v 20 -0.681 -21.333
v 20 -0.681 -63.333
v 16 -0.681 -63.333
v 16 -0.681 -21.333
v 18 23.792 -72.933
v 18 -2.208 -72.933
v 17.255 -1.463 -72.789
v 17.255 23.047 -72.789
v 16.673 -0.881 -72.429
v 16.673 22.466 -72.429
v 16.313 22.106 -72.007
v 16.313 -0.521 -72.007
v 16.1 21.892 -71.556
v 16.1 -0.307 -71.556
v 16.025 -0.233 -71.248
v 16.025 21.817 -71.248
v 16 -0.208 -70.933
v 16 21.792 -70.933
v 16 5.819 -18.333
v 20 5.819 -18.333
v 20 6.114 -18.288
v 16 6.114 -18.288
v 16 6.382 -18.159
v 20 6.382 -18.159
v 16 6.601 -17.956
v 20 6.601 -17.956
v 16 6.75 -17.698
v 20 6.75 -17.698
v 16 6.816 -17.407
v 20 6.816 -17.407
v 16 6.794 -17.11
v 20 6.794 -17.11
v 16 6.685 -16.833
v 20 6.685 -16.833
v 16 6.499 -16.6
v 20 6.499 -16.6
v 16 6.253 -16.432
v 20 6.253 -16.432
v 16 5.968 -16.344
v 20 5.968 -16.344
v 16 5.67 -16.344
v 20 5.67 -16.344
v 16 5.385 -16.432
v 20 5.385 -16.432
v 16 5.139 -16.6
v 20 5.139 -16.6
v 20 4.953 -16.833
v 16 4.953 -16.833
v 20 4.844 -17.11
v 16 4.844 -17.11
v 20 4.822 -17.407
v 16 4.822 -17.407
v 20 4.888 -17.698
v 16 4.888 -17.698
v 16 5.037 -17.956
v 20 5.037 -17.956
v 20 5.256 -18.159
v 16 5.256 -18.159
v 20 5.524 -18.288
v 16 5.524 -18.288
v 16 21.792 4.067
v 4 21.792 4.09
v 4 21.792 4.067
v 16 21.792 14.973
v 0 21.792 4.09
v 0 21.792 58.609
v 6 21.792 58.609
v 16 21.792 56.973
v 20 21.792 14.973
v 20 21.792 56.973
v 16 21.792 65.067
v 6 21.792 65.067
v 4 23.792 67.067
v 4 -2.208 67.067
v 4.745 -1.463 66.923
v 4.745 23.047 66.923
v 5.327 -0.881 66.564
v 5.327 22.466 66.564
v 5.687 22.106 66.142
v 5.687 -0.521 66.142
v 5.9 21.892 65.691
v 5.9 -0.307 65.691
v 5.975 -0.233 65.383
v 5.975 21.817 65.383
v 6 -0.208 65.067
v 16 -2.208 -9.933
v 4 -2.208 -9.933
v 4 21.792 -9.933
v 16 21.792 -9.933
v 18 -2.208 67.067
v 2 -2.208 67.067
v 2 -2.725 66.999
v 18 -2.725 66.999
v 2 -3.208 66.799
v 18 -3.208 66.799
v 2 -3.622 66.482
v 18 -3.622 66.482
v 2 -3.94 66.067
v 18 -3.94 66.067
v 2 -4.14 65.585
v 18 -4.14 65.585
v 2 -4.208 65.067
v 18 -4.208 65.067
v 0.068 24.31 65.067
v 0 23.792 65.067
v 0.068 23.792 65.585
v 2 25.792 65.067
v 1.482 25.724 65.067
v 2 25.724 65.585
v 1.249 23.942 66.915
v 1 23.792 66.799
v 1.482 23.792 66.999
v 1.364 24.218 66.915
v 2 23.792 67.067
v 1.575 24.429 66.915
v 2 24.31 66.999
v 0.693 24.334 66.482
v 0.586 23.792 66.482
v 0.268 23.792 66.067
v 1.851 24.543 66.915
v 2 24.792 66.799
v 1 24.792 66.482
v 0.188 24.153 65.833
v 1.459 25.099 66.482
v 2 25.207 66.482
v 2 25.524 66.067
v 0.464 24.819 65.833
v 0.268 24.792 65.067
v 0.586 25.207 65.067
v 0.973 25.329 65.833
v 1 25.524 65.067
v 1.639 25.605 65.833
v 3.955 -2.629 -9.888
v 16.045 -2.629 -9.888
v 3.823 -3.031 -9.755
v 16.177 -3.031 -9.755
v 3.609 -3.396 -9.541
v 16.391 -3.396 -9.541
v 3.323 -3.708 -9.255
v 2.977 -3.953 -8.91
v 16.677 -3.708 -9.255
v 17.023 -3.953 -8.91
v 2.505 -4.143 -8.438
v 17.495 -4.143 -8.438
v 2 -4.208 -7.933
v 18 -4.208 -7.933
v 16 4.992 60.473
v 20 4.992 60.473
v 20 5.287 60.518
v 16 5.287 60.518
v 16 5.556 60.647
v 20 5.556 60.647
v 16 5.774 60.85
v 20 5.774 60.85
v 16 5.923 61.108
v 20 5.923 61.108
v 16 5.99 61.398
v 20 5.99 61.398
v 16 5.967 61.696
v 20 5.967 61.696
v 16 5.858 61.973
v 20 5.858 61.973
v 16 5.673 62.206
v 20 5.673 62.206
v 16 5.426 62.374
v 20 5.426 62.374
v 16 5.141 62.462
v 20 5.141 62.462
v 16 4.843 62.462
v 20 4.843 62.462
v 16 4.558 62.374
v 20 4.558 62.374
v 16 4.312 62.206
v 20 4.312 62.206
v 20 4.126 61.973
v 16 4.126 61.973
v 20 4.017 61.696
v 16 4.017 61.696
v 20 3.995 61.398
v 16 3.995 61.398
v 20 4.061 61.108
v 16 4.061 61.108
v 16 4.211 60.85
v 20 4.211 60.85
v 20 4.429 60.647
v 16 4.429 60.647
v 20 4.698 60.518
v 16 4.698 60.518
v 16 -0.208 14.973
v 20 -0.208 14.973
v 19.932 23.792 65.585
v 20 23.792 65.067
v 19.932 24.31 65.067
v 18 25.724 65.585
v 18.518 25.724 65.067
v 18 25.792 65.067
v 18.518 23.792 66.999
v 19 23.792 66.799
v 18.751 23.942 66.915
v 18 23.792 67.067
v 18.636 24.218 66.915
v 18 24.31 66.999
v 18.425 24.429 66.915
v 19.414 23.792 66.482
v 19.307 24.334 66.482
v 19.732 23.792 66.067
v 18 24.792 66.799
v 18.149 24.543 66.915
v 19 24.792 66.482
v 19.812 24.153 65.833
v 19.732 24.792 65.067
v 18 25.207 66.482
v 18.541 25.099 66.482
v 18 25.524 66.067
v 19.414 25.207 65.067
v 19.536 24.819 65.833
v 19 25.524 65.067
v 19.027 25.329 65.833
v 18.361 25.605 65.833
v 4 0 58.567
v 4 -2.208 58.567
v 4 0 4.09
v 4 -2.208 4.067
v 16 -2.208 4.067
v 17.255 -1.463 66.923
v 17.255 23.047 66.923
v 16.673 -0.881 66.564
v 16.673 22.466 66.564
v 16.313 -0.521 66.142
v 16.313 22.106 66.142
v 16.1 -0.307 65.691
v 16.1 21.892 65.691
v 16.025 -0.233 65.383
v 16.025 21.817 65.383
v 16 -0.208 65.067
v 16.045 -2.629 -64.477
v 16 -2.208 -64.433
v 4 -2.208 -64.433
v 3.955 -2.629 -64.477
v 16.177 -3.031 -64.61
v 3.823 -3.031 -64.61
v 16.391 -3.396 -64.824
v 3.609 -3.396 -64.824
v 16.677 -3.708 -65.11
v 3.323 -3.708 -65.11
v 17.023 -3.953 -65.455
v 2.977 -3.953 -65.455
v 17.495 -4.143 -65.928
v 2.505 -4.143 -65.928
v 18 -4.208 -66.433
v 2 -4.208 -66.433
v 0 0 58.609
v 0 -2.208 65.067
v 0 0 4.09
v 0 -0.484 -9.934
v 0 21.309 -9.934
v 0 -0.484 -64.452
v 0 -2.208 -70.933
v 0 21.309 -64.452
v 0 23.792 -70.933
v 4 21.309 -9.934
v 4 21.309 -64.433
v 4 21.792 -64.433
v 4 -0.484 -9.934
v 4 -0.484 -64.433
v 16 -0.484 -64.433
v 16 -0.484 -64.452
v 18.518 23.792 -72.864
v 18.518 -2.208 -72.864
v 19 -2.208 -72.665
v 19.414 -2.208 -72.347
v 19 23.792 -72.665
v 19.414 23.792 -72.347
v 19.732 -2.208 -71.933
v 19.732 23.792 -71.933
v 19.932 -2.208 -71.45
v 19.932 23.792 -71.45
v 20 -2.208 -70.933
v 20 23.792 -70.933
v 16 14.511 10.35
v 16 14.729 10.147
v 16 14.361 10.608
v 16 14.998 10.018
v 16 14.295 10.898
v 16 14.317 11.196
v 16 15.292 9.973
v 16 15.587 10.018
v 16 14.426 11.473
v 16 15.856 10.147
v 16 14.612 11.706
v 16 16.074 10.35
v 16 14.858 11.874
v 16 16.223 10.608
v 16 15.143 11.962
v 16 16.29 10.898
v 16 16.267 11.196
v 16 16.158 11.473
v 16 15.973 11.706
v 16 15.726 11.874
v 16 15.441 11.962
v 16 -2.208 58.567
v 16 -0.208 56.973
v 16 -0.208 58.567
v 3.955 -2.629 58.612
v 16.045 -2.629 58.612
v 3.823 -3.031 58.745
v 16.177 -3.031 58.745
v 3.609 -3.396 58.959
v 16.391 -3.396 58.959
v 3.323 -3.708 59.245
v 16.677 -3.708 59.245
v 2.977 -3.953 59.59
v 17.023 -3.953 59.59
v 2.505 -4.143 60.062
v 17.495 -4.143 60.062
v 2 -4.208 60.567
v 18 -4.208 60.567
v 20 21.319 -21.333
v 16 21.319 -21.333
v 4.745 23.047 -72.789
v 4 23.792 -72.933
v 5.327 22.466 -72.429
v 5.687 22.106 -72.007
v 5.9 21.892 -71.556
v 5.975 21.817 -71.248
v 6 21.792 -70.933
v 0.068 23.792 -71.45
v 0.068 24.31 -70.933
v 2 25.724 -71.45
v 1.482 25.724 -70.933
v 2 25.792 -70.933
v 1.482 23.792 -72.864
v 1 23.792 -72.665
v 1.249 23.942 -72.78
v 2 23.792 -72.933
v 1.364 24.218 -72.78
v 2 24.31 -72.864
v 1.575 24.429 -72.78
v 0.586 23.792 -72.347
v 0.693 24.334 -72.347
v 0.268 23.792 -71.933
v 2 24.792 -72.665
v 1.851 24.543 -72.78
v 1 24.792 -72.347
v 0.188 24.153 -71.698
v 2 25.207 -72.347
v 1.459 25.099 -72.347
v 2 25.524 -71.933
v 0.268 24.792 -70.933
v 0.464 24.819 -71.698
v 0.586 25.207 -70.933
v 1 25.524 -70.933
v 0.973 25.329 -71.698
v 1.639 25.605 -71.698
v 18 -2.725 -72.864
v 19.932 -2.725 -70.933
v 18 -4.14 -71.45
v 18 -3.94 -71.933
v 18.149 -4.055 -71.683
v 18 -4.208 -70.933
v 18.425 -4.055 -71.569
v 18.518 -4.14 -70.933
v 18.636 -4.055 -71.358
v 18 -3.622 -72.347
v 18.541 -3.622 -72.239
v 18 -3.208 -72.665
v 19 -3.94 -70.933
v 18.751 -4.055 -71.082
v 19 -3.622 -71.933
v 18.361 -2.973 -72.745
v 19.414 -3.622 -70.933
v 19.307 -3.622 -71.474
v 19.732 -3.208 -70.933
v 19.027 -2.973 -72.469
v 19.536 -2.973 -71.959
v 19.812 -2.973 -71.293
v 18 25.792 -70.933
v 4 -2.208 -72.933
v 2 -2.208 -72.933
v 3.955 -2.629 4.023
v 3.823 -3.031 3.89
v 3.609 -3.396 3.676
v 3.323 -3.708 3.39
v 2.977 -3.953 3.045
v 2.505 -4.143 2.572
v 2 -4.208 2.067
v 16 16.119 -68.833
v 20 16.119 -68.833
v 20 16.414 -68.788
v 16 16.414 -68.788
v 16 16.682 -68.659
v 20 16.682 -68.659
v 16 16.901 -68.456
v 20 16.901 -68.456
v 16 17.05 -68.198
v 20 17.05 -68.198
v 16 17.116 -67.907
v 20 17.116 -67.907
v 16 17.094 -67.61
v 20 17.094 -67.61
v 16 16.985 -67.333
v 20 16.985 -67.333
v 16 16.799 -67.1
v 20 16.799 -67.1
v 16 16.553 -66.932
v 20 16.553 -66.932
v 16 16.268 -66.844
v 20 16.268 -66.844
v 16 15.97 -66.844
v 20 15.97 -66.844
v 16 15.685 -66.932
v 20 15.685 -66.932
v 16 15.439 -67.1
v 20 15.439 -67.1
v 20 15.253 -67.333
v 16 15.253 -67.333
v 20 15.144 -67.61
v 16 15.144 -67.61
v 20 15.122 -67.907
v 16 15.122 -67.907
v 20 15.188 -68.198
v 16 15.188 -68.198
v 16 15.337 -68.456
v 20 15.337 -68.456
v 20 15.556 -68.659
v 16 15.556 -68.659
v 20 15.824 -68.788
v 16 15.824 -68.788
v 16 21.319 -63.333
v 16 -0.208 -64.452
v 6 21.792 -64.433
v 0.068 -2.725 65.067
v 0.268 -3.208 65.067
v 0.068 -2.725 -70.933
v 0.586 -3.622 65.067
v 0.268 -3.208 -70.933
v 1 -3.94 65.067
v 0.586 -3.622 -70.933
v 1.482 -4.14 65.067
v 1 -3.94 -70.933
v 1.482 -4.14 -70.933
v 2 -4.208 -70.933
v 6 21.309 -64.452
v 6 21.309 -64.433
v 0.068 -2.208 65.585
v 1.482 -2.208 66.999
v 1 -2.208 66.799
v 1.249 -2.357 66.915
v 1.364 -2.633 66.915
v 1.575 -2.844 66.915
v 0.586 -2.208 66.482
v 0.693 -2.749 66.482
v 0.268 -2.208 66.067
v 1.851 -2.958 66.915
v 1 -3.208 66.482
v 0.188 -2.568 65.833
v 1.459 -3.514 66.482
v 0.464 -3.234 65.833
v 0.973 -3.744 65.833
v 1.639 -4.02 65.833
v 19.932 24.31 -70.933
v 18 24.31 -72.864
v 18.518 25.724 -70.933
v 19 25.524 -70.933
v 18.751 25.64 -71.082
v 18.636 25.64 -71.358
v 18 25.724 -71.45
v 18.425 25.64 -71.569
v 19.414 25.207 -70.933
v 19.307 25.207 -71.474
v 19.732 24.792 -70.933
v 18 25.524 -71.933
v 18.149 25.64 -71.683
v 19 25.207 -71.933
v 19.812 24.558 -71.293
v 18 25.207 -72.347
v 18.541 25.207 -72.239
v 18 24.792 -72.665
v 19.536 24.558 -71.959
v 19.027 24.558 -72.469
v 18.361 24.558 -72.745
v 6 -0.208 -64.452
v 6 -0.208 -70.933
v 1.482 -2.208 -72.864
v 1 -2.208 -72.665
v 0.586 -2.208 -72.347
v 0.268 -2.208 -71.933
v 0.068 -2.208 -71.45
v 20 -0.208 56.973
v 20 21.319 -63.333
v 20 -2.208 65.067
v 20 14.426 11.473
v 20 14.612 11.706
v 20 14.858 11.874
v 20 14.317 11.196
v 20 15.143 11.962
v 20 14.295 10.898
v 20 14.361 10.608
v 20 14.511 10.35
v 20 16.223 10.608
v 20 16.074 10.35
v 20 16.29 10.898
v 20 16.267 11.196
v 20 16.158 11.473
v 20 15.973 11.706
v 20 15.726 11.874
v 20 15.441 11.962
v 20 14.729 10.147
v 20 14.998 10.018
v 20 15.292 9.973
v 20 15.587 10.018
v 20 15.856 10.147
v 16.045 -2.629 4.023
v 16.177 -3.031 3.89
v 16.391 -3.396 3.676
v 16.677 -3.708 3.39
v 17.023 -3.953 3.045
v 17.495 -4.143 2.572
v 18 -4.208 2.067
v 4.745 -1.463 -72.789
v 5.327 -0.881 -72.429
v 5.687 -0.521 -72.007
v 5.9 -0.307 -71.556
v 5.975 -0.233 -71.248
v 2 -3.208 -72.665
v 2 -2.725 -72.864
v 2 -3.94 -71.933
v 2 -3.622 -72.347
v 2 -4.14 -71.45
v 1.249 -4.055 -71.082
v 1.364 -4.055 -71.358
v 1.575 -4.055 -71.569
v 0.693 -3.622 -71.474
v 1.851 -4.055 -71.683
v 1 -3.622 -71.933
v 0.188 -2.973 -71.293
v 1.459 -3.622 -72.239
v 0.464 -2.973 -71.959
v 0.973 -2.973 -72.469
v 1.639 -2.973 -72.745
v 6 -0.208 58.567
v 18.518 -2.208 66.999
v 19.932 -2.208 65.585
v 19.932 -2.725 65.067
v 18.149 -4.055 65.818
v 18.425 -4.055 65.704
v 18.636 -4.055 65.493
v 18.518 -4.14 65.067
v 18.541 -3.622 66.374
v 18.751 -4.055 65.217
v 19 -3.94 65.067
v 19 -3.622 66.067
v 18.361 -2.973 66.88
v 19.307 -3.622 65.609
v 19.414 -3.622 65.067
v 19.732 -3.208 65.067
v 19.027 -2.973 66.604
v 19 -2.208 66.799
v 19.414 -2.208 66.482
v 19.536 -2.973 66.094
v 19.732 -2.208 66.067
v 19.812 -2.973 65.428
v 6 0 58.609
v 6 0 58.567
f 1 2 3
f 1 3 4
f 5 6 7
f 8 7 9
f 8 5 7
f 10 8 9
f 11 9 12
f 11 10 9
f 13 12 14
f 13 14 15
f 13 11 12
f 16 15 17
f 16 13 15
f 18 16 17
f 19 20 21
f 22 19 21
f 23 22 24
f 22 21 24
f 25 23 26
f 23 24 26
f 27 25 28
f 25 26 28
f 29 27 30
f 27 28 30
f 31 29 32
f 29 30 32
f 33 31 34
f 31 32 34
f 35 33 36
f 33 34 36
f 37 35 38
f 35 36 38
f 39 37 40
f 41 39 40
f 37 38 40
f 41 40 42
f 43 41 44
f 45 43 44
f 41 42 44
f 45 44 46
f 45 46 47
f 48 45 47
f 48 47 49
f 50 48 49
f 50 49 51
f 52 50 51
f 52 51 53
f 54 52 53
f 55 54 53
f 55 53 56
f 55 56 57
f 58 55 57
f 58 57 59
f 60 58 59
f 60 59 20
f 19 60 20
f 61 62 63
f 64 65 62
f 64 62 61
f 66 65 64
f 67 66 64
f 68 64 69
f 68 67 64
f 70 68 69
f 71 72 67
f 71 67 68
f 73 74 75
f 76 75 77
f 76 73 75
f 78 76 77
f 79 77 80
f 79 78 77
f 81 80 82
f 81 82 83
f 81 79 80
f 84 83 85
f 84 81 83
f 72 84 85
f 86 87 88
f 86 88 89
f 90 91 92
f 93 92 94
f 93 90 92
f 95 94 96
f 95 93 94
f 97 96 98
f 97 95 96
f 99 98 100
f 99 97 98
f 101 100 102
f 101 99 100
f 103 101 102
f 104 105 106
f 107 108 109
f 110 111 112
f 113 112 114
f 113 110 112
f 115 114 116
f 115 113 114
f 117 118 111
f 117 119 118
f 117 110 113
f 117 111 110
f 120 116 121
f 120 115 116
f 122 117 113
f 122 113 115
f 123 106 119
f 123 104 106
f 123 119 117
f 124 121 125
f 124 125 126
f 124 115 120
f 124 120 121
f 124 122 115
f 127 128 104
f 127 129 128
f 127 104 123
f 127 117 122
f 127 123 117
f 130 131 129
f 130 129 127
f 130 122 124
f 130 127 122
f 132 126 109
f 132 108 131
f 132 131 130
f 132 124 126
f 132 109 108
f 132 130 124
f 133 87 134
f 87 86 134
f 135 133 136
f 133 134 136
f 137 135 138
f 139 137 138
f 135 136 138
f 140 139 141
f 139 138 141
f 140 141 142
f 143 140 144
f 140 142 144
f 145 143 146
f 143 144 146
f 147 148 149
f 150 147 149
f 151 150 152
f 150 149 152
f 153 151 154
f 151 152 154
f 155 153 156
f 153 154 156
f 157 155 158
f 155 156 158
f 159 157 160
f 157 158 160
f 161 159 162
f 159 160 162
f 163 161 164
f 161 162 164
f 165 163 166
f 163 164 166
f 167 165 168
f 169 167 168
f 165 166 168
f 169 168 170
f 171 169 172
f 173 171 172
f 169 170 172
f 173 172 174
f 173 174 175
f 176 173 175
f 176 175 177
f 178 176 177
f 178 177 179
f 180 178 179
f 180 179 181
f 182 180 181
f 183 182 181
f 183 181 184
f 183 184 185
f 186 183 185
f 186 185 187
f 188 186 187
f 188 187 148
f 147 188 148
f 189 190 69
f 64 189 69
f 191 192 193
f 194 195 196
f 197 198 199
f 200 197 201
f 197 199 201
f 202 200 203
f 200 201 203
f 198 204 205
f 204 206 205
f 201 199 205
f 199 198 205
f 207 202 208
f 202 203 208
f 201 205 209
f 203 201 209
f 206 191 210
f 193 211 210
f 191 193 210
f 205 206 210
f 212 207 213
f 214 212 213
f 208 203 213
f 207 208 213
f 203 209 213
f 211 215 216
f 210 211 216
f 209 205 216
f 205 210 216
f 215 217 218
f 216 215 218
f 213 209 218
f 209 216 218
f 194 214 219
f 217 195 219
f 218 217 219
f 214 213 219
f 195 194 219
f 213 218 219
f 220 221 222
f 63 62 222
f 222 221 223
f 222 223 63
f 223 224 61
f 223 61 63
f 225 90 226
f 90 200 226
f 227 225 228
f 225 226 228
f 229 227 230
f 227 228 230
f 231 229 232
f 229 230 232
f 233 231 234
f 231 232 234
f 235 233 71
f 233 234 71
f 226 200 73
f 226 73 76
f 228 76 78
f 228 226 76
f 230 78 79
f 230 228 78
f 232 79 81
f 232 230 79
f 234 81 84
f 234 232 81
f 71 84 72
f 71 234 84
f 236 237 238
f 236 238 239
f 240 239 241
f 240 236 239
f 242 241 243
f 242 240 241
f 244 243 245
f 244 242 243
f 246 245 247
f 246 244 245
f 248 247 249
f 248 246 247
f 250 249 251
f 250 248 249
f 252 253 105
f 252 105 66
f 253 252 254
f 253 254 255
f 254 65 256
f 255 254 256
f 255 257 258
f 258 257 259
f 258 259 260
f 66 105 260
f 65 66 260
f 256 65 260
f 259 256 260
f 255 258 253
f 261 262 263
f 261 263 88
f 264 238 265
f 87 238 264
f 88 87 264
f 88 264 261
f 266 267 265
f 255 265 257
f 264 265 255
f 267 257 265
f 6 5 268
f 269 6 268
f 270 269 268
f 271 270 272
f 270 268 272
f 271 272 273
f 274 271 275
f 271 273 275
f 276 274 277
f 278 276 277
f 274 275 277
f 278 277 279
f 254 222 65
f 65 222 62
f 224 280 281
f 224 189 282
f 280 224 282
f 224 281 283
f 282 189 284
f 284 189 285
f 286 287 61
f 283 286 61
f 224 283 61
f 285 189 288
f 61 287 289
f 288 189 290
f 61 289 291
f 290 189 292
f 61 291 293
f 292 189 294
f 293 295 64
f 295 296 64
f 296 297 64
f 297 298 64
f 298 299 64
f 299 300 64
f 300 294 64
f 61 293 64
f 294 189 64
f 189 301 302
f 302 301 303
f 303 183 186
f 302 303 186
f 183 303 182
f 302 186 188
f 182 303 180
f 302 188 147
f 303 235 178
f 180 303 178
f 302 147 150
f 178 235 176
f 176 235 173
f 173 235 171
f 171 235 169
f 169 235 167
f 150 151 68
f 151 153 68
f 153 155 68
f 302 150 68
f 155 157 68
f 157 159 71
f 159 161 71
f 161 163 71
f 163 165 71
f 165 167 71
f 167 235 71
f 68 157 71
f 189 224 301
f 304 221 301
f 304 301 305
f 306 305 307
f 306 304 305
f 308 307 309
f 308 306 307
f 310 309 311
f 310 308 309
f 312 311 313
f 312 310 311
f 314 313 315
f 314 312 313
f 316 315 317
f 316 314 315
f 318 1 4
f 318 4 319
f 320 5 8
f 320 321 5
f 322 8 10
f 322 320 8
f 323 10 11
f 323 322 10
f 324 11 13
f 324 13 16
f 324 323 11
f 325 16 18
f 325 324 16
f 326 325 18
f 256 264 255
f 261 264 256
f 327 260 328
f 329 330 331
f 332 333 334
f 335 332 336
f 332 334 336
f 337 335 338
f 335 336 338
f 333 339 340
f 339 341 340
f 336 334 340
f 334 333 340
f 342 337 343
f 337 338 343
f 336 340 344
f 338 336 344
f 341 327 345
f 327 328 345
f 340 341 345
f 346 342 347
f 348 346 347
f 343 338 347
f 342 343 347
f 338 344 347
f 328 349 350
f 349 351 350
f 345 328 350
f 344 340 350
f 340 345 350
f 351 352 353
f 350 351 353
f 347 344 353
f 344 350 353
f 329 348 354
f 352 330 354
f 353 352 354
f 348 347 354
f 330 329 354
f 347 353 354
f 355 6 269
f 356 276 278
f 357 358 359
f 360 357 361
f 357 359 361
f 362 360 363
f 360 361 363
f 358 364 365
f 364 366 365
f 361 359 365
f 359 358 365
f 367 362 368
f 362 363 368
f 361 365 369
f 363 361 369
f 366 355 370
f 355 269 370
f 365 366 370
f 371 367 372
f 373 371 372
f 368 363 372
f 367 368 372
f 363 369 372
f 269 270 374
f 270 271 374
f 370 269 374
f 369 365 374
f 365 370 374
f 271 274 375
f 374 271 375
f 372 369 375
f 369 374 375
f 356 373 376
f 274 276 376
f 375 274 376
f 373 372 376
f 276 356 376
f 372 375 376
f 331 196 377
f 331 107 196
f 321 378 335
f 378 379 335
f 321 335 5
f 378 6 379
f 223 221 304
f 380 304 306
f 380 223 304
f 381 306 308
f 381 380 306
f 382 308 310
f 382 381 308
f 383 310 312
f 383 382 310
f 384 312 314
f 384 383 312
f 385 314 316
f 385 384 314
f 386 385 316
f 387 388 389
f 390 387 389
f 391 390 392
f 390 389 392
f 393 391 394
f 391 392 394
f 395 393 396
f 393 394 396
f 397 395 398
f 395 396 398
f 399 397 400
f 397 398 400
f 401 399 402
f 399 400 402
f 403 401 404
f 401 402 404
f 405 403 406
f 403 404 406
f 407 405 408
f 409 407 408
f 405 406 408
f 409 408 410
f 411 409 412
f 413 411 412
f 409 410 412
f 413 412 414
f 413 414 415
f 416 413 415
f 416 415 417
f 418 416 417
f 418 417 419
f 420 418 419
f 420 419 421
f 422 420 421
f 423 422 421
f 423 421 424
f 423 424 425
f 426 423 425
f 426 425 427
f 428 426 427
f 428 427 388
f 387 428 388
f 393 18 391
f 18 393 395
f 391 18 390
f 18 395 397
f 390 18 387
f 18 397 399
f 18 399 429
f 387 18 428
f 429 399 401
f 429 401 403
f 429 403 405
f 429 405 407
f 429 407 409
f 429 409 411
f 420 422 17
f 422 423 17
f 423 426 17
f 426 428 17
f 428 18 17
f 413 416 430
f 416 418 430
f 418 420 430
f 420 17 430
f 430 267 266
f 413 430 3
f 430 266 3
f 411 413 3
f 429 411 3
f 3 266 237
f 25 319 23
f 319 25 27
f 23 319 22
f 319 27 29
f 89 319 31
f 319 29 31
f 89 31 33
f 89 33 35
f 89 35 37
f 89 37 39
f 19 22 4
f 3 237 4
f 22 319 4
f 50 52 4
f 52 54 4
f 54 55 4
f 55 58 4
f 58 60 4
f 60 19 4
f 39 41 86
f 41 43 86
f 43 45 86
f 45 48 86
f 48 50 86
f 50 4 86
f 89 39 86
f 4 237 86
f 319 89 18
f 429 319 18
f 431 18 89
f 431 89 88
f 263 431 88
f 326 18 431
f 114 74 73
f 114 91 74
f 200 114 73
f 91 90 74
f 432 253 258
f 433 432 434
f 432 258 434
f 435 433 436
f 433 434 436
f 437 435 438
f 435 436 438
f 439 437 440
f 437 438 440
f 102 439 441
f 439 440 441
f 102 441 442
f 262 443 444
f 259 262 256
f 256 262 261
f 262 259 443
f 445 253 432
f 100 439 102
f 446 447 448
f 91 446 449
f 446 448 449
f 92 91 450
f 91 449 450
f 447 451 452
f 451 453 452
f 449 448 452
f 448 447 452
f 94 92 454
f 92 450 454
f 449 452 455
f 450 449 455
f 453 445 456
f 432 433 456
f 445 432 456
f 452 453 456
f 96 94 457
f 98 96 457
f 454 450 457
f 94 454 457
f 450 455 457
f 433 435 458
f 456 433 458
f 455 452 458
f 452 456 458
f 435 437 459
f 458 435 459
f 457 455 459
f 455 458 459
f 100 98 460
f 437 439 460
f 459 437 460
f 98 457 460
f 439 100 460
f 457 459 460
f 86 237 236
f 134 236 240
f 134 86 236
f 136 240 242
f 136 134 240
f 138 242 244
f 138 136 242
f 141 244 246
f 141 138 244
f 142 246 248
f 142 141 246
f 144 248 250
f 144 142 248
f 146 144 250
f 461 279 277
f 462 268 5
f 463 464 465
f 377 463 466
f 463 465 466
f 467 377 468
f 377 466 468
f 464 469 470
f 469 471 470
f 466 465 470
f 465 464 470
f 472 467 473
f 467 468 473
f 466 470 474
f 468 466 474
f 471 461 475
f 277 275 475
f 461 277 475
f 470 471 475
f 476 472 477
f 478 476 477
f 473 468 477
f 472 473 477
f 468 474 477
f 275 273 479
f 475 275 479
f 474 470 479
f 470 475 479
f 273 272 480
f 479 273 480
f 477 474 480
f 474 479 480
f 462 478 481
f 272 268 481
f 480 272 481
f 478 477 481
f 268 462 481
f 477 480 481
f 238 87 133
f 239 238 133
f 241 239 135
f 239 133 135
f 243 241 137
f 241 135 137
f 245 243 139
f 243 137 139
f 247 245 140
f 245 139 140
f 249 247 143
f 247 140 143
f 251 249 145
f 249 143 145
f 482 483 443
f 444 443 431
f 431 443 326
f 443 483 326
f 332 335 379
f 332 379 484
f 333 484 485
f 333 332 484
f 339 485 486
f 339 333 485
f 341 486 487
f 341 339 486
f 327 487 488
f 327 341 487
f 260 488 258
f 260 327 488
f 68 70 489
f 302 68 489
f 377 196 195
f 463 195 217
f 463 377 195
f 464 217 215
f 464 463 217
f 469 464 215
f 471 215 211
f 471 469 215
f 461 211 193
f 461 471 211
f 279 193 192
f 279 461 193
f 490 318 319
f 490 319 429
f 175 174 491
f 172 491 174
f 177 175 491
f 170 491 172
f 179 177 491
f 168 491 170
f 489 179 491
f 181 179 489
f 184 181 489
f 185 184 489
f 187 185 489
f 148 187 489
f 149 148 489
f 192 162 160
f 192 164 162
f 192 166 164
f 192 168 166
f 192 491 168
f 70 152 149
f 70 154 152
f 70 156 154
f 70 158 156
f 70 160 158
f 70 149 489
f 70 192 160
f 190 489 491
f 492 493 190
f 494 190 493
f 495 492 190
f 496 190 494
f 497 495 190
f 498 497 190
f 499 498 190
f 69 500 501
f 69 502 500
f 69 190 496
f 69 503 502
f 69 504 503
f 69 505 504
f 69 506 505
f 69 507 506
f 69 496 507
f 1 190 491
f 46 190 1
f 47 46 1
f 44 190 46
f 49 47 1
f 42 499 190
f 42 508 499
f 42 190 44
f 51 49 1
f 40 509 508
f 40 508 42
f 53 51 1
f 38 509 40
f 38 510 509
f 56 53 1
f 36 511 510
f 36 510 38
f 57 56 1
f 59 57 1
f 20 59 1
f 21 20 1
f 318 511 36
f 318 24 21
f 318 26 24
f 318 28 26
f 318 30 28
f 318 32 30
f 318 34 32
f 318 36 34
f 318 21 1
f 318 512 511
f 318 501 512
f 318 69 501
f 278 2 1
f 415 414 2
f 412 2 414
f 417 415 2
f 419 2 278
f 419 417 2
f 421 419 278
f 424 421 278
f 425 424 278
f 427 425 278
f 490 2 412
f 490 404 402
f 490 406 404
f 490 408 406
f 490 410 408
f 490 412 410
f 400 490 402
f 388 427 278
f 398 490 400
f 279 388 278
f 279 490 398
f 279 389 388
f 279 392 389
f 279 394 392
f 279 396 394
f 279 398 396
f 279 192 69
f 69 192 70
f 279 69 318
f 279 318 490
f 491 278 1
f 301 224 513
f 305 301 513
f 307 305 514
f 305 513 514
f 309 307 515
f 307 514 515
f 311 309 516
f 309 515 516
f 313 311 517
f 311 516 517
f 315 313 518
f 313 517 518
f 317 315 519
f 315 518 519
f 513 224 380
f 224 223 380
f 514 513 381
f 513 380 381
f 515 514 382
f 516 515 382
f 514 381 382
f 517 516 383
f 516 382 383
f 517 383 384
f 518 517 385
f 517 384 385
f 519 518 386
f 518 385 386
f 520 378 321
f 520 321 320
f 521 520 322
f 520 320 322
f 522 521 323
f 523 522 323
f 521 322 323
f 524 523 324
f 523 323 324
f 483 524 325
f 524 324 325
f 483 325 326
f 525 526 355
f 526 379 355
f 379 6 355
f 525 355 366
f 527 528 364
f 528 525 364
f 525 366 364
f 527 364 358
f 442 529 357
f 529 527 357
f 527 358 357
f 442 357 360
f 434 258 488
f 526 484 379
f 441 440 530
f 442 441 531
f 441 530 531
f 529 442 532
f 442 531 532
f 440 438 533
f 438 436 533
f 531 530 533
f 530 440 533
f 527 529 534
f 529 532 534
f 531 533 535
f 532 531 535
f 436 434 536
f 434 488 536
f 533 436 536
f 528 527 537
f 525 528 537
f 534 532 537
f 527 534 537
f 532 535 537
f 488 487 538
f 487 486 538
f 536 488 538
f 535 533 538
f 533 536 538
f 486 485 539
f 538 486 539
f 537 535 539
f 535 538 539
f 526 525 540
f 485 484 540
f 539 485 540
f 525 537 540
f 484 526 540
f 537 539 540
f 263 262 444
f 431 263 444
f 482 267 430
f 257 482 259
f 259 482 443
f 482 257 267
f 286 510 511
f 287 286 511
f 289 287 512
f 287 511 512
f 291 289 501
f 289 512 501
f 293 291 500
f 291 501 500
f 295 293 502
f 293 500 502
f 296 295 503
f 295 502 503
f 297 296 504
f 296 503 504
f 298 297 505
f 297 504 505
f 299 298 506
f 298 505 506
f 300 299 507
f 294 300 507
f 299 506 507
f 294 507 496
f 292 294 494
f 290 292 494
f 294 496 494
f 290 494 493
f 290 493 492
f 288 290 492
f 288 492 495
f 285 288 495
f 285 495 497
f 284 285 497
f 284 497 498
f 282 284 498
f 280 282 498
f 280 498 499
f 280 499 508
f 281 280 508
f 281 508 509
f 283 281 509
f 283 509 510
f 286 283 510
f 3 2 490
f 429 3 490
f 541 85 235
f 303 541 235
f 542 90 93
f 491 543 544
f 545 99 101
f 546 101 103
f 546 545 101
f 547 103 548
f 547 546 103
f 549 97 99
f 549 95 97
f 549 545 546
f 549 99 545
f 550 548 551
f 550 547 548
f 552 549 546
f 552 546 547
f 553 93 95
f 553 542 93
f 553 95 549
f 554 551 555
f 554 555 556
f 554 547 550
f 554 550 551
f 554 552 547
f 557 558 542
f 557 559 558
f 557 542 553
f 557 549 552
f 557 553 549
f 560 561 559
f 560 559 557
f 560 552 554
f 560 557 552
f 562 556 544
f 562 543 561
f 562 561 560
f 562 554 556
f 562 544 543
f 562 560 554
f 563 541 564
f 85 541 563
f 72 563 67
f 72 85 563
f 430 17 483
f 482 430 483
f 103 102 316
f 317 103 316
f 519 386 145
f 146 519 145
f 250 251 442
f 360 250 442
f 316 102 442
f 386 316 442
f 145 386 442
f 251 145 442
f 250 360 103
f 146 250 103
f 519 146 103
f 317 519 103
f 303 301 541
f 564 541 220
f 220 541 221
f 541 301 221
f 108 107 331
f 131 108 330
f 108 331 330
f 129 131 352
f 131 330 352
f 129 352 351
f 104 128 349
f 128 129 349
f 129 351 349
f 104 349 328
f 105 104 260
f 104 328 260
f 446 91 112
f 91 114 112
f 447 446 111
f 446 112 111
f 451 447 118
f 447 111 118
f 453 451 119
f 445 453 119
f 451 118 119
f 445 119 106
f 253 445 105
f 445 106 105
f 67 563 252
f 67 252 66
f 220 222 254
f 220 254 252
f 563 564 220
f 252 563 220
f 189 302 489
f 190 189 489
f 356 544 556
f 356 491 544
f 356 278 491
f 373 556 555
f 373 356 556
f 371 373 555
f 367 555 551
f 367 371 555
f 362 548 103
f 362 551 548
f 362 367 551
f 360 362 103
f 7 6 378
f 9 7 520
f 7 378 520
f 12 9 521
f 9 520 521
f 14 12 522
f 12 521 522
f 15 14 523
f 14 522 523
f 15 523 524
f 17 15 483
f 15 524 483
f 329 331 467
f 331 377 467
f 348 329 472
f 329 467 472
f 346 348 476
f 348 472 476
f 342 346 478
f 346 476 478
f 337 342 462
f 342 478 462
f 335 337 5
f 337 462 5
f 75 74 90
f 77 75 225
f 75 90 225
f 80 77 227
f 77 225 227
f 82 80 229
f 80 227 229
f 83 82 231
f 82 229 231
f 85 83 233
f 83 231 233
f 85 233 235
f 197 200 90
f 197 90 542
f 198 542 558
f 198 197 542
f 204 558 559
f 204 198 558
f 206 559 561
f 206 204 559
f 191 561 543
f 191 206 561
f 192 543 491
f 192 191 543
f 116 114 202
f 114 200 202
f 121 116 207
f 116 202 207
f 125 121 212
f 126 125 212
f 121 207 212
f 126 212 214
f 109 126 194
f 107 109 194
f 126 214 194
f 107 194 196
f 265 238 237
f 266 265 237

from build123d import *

# Parameters (mm, degrees)
ESQUISSE1_W             = 140
ESQUISSE1_H             = 30
BOSS_EXTRU_1_DEPTH      = 20
ESQUISSE2_R             = 1
ENL_V_MAT_EXTRU_1_DEPTH = 10
ESQUISSE4_R             = 1
ENL_V_MAT_EXTRU_2_DEPTH = 10
ESQUISSE5_W             = 10
ESQUISSE5_H             = 22
ENL_V_MAT_EXTRU_3_DEPTH = 63
ESQUISSE6_W             = 10
ESQUISSE6_H             = 22
ENL_V_MAT_EXTRU_4_DEPTH = 63
ENL_V_MAT_EXTRU_5_REACH = 83.358
ESQUISSE7_W             = 12
ESQUISSE7_H             = 54.5
ENL_V_MAT_EXTRU_6_REACH = 83.358
ESQUISSE8_W             = 12
ESQUISSE8_H             = 54.5
CONG_1_R                = 2
ESQUISSE9_W             = 54.518801533
ESQUISSE9_H             = 21.792349727
ENL_V_MAT_EXTRU_7_DEPTH = 79.996266608
ESQUISSE11_W            = 54.518801533
ESQUISSE11_H            = 21.792349727
ENL_V_MAT_EXTRU_8_DEPTH = 79.996266608


with BuildPart() as part:
    # Esquisse1 → Boss.-Extru.1 (new body)
    with BuildSketch(Plane(origin=(0, 0, 0), x_dir=(0, 0, -1), z_dir=(1, 0, 0))):
        with Locations((2.932604736, 10.792349727)):
            Rectangle(ESQUISSE1_W, ESQUISSE1_H)
    extrude(amount=BOSS_EXTRU_1_DEPTH)

    # Esquisse2 → Enlèv. mat.-Extru.1 (cut)
    with BuildSketch(Plane(origin=(20, 0, 0), x_dir=(0, 0, -1), z_dir=(1, 0, 0))):
        with Locations((67.832604736, 16.118903051)):
            Circle(ESQUISSE2_R)
        with Locations((17.332604736, 5.818903051)):
            Circle(ESQUISSE2_R)
        Polygon((63.332604736, -0.681096949), (21.332604736, -0.681096949), (21.332604736, 21.318903051), (63.332604736, 21.318903051), (63.332604736, 12.318903051), (63.332604736, 8.068903051), align=None)
    extrude(amount=-ENL_V_MAT_EXTRU_1_DEPTH, mode=Mode.SUBTRACT)

    # Esquisse4 → Enlèv. mat.-Extru.2 (cut)
    with BuildSketch(Plane(origin=(20, 26.612998823, 128.329870586), x_dir=(0, 0, 1), z_dir=(1, 0, 0))):
        with Locations(Location((-117.356713594, 11.320649096, 0), (0, 0, 180))):
            Circle(ESQUISSE4_R)
        with Locations(Location((-66.856713594, 21.620649096, 0), (0, 0, 180))):
            Circle(ESQUISSE4_R)
        Polygon((-113.356713594, 26.820649096), (-113.356713594, 4.820649096), (-71.356713594, 4.820649096), (-71.356713594, 13.570649096), (-71.356713594, 18.070649096), (-71.356713594, 26.820649096), align=None)
    extrude(amount=-ENL_V_MAT_EXTRU_2_DEPTH, mode=Mode.SUBTRACT)

    # Esquisse5 → Enlèv. mat.-Extru.3 (cut)
    with BuildSketch(Plane.XY.offset(67.067395264)):
        with Locations((11, 10.792349727)):
            Rectangle(ESQUISSE5_W, ESQUISSE5_H)
    extrude(amount=-ENL_V_MAT_EXTRU_3_DEPTH, mode=Mode.SUBTRACT)

    # Esquisse6 → Enlèv. mat.-Extru.4 (cut)
    with BuildSketch(Plane(origin=(0, 0, -72.932604736), x_dir=(-1, 0, 0), z_dir=(0, 0, -1))):
        with Locations((-11, 10.792349727)):
            Rectangle(ESQUISSE6_W, ESQUISSE6_H)
    extrude(amount=-ENL_V_MAT_EXTRU_4_DEPTH, mode=Mode.SUBTRACT)

    # Enlèv. mat.-Extru.5: up to this face of the body (flat: up to its plane)
    enl_v_mat_extru_5_end = Plane(part.part.faces().sort_by_distance((11, 21.792349727, -41.432604736))[0])
    # Esquisse7 → Enlèv. mat.-Extru.5 (cut, up to the picked face)
    with BuildSketch(Plane.XZ.offset(4.207650273), mode=Mode.PRIVATE) as enl_v_mat_extru_5_sk1:
        with Locations((10, -37.182604736)):
            Rectangle(ESQUISSE7_W, ESQUISSE7_H)
    enl_v_mat_extru_5_tool1 = split(extrude(enl_v_mat_extru_5_sk1.sketch, amount=-ENL_V_MAT_EXTRU_5_REACH, mode=Mode.PRIVATE), bisect_by=enl_v_mat_extru_5_end, keep=Keep.BOTH, mode=Mode.PRIVATE)
    add(enl_v_mat_extru_5_tool1.solids().sort_by(Axis((10, -4.20765, -37.182605), (0, 1, 0)))[0], mode=Mode.SUBTRACT)

    # Enlèv. mat.-Extru.6: up to this face of the body (flat: up to its plane)
    enl_v_mat_extru_6_end = Plane(part.part.faces().sort_by_distance((12.473684211, 21.792349727, 35.652818786))[0])
    # Esquisse8 → Enlèv. mat.-Extru.6 (cut, up to the picked face)
    with BuildSketch(Plane(origin=(0, -4.207650273, 0), x_dir=(-1, 0, 0), z_dir=(0, -1, 0)), mode=Mode.PRIVATE) as enl_v_mat_extru_6_sk1:
        with Locations((-10, -31.317395264)):
            Rectangle(ESQUISSE8_W, ESQUISSE8_H)
    enl_v_mat_extru_6_tool1 = split(extrude(enl_v_mat_extru_6_sk1.sketch, amount=-ENL_V_MAT_EXTRU_6_REACH, mode=Mode.PRIVATE), bisect_by=enl_v_mat_extru_6_end, keep=Keep.BOTH, mode=Mode.PRIVATE)
    add(enl_v_mat_extru_6_tool1.solids().sort_by(Axis((10, -4.20765, 31.317395), (0, 1, 0)))[0], mode=Mode.SUBTRACT)

    # Congé1
    cong_1_edges = [part.edges().sort_by_distance(p)[0] for p in [
        (4, -4.207650273, -37.182604736),
        (10, -4.207650273, -64.432604736),
        (16, -4.207650273, -37.182604736),
        (10, -4.207650273, -9.932604736),
        (20, 10.792349727, -72.932604736),
        (4, -4.207650273, 31.317395264),
        (10, -4.207650273, 4.067395264),
        (16, -4.207650273, 31.317395264),
        (10, -4.207650273, 58.567395264),
        (20, 25.792349727, -2.932604736),
        (20, 10.792349727, 67.067395264),
        (0, 25.792349727, -2.932604736),
        (0, 10.792349727, -72.932604736),
        (0, -4.207650273, -2.932604736),
        (0, 10.792349727, 67.067395264),
        (11, 21.792349727, 67.067395264),
        (6, 10.792349727, 67.067395264),
        (11, -0.207650273, 67.067395264),
        (16, 10.792349727, 67.067395264),
        (10, 25.792349727, 67.067395264),
        (10, 25.792349727, -72.932604736),
        (10, -4.207650273, -72.932604736),
        (10, -4.207650273, 67.067395264),
        (20, -4.207650273, -2.932604736),
        (11, 21.792349727, -72.932604736),
        (16, 10.792349727, -72.932604736),
        (11, -0.207650273, -72.932604736),
        (6, 10.792349727, -72.932604736),
    ]]
    fillet(cong_1_edges, radius=CONG_1_R - 0.0001)  # a hair under: the kernel refuses the full size

    # Esquisse9 → Enlèv. mat.-Extru.7 (cut, through all)
    with BuildSketch(Plane.ZY.offset(-16)):
        with Locations((31.349786376, 10.896174864)):
            Rectangle(ESQUISSE9_W, ESQUISSE9_H)
    extrude(amount=ENL_V_MAT_EXTRU_7_DEPTH, mode=Mode.SUBTRACT)

    # Esquisse11 → Enlèv. mat.-Extru.8 (cut, through all)
    with BuildSketch(Plane.ZY.offset(-16)):
        with Locations((-37.192905042, 10.412626725)):
            Rectangle(ESQUISSE11_W, ESQUISSE11_H)
    extrude(amount=ENL_V_MAT_EXTRU_8_DEPTH, mode=Mode.SUBTRACT)


solid = part.part
